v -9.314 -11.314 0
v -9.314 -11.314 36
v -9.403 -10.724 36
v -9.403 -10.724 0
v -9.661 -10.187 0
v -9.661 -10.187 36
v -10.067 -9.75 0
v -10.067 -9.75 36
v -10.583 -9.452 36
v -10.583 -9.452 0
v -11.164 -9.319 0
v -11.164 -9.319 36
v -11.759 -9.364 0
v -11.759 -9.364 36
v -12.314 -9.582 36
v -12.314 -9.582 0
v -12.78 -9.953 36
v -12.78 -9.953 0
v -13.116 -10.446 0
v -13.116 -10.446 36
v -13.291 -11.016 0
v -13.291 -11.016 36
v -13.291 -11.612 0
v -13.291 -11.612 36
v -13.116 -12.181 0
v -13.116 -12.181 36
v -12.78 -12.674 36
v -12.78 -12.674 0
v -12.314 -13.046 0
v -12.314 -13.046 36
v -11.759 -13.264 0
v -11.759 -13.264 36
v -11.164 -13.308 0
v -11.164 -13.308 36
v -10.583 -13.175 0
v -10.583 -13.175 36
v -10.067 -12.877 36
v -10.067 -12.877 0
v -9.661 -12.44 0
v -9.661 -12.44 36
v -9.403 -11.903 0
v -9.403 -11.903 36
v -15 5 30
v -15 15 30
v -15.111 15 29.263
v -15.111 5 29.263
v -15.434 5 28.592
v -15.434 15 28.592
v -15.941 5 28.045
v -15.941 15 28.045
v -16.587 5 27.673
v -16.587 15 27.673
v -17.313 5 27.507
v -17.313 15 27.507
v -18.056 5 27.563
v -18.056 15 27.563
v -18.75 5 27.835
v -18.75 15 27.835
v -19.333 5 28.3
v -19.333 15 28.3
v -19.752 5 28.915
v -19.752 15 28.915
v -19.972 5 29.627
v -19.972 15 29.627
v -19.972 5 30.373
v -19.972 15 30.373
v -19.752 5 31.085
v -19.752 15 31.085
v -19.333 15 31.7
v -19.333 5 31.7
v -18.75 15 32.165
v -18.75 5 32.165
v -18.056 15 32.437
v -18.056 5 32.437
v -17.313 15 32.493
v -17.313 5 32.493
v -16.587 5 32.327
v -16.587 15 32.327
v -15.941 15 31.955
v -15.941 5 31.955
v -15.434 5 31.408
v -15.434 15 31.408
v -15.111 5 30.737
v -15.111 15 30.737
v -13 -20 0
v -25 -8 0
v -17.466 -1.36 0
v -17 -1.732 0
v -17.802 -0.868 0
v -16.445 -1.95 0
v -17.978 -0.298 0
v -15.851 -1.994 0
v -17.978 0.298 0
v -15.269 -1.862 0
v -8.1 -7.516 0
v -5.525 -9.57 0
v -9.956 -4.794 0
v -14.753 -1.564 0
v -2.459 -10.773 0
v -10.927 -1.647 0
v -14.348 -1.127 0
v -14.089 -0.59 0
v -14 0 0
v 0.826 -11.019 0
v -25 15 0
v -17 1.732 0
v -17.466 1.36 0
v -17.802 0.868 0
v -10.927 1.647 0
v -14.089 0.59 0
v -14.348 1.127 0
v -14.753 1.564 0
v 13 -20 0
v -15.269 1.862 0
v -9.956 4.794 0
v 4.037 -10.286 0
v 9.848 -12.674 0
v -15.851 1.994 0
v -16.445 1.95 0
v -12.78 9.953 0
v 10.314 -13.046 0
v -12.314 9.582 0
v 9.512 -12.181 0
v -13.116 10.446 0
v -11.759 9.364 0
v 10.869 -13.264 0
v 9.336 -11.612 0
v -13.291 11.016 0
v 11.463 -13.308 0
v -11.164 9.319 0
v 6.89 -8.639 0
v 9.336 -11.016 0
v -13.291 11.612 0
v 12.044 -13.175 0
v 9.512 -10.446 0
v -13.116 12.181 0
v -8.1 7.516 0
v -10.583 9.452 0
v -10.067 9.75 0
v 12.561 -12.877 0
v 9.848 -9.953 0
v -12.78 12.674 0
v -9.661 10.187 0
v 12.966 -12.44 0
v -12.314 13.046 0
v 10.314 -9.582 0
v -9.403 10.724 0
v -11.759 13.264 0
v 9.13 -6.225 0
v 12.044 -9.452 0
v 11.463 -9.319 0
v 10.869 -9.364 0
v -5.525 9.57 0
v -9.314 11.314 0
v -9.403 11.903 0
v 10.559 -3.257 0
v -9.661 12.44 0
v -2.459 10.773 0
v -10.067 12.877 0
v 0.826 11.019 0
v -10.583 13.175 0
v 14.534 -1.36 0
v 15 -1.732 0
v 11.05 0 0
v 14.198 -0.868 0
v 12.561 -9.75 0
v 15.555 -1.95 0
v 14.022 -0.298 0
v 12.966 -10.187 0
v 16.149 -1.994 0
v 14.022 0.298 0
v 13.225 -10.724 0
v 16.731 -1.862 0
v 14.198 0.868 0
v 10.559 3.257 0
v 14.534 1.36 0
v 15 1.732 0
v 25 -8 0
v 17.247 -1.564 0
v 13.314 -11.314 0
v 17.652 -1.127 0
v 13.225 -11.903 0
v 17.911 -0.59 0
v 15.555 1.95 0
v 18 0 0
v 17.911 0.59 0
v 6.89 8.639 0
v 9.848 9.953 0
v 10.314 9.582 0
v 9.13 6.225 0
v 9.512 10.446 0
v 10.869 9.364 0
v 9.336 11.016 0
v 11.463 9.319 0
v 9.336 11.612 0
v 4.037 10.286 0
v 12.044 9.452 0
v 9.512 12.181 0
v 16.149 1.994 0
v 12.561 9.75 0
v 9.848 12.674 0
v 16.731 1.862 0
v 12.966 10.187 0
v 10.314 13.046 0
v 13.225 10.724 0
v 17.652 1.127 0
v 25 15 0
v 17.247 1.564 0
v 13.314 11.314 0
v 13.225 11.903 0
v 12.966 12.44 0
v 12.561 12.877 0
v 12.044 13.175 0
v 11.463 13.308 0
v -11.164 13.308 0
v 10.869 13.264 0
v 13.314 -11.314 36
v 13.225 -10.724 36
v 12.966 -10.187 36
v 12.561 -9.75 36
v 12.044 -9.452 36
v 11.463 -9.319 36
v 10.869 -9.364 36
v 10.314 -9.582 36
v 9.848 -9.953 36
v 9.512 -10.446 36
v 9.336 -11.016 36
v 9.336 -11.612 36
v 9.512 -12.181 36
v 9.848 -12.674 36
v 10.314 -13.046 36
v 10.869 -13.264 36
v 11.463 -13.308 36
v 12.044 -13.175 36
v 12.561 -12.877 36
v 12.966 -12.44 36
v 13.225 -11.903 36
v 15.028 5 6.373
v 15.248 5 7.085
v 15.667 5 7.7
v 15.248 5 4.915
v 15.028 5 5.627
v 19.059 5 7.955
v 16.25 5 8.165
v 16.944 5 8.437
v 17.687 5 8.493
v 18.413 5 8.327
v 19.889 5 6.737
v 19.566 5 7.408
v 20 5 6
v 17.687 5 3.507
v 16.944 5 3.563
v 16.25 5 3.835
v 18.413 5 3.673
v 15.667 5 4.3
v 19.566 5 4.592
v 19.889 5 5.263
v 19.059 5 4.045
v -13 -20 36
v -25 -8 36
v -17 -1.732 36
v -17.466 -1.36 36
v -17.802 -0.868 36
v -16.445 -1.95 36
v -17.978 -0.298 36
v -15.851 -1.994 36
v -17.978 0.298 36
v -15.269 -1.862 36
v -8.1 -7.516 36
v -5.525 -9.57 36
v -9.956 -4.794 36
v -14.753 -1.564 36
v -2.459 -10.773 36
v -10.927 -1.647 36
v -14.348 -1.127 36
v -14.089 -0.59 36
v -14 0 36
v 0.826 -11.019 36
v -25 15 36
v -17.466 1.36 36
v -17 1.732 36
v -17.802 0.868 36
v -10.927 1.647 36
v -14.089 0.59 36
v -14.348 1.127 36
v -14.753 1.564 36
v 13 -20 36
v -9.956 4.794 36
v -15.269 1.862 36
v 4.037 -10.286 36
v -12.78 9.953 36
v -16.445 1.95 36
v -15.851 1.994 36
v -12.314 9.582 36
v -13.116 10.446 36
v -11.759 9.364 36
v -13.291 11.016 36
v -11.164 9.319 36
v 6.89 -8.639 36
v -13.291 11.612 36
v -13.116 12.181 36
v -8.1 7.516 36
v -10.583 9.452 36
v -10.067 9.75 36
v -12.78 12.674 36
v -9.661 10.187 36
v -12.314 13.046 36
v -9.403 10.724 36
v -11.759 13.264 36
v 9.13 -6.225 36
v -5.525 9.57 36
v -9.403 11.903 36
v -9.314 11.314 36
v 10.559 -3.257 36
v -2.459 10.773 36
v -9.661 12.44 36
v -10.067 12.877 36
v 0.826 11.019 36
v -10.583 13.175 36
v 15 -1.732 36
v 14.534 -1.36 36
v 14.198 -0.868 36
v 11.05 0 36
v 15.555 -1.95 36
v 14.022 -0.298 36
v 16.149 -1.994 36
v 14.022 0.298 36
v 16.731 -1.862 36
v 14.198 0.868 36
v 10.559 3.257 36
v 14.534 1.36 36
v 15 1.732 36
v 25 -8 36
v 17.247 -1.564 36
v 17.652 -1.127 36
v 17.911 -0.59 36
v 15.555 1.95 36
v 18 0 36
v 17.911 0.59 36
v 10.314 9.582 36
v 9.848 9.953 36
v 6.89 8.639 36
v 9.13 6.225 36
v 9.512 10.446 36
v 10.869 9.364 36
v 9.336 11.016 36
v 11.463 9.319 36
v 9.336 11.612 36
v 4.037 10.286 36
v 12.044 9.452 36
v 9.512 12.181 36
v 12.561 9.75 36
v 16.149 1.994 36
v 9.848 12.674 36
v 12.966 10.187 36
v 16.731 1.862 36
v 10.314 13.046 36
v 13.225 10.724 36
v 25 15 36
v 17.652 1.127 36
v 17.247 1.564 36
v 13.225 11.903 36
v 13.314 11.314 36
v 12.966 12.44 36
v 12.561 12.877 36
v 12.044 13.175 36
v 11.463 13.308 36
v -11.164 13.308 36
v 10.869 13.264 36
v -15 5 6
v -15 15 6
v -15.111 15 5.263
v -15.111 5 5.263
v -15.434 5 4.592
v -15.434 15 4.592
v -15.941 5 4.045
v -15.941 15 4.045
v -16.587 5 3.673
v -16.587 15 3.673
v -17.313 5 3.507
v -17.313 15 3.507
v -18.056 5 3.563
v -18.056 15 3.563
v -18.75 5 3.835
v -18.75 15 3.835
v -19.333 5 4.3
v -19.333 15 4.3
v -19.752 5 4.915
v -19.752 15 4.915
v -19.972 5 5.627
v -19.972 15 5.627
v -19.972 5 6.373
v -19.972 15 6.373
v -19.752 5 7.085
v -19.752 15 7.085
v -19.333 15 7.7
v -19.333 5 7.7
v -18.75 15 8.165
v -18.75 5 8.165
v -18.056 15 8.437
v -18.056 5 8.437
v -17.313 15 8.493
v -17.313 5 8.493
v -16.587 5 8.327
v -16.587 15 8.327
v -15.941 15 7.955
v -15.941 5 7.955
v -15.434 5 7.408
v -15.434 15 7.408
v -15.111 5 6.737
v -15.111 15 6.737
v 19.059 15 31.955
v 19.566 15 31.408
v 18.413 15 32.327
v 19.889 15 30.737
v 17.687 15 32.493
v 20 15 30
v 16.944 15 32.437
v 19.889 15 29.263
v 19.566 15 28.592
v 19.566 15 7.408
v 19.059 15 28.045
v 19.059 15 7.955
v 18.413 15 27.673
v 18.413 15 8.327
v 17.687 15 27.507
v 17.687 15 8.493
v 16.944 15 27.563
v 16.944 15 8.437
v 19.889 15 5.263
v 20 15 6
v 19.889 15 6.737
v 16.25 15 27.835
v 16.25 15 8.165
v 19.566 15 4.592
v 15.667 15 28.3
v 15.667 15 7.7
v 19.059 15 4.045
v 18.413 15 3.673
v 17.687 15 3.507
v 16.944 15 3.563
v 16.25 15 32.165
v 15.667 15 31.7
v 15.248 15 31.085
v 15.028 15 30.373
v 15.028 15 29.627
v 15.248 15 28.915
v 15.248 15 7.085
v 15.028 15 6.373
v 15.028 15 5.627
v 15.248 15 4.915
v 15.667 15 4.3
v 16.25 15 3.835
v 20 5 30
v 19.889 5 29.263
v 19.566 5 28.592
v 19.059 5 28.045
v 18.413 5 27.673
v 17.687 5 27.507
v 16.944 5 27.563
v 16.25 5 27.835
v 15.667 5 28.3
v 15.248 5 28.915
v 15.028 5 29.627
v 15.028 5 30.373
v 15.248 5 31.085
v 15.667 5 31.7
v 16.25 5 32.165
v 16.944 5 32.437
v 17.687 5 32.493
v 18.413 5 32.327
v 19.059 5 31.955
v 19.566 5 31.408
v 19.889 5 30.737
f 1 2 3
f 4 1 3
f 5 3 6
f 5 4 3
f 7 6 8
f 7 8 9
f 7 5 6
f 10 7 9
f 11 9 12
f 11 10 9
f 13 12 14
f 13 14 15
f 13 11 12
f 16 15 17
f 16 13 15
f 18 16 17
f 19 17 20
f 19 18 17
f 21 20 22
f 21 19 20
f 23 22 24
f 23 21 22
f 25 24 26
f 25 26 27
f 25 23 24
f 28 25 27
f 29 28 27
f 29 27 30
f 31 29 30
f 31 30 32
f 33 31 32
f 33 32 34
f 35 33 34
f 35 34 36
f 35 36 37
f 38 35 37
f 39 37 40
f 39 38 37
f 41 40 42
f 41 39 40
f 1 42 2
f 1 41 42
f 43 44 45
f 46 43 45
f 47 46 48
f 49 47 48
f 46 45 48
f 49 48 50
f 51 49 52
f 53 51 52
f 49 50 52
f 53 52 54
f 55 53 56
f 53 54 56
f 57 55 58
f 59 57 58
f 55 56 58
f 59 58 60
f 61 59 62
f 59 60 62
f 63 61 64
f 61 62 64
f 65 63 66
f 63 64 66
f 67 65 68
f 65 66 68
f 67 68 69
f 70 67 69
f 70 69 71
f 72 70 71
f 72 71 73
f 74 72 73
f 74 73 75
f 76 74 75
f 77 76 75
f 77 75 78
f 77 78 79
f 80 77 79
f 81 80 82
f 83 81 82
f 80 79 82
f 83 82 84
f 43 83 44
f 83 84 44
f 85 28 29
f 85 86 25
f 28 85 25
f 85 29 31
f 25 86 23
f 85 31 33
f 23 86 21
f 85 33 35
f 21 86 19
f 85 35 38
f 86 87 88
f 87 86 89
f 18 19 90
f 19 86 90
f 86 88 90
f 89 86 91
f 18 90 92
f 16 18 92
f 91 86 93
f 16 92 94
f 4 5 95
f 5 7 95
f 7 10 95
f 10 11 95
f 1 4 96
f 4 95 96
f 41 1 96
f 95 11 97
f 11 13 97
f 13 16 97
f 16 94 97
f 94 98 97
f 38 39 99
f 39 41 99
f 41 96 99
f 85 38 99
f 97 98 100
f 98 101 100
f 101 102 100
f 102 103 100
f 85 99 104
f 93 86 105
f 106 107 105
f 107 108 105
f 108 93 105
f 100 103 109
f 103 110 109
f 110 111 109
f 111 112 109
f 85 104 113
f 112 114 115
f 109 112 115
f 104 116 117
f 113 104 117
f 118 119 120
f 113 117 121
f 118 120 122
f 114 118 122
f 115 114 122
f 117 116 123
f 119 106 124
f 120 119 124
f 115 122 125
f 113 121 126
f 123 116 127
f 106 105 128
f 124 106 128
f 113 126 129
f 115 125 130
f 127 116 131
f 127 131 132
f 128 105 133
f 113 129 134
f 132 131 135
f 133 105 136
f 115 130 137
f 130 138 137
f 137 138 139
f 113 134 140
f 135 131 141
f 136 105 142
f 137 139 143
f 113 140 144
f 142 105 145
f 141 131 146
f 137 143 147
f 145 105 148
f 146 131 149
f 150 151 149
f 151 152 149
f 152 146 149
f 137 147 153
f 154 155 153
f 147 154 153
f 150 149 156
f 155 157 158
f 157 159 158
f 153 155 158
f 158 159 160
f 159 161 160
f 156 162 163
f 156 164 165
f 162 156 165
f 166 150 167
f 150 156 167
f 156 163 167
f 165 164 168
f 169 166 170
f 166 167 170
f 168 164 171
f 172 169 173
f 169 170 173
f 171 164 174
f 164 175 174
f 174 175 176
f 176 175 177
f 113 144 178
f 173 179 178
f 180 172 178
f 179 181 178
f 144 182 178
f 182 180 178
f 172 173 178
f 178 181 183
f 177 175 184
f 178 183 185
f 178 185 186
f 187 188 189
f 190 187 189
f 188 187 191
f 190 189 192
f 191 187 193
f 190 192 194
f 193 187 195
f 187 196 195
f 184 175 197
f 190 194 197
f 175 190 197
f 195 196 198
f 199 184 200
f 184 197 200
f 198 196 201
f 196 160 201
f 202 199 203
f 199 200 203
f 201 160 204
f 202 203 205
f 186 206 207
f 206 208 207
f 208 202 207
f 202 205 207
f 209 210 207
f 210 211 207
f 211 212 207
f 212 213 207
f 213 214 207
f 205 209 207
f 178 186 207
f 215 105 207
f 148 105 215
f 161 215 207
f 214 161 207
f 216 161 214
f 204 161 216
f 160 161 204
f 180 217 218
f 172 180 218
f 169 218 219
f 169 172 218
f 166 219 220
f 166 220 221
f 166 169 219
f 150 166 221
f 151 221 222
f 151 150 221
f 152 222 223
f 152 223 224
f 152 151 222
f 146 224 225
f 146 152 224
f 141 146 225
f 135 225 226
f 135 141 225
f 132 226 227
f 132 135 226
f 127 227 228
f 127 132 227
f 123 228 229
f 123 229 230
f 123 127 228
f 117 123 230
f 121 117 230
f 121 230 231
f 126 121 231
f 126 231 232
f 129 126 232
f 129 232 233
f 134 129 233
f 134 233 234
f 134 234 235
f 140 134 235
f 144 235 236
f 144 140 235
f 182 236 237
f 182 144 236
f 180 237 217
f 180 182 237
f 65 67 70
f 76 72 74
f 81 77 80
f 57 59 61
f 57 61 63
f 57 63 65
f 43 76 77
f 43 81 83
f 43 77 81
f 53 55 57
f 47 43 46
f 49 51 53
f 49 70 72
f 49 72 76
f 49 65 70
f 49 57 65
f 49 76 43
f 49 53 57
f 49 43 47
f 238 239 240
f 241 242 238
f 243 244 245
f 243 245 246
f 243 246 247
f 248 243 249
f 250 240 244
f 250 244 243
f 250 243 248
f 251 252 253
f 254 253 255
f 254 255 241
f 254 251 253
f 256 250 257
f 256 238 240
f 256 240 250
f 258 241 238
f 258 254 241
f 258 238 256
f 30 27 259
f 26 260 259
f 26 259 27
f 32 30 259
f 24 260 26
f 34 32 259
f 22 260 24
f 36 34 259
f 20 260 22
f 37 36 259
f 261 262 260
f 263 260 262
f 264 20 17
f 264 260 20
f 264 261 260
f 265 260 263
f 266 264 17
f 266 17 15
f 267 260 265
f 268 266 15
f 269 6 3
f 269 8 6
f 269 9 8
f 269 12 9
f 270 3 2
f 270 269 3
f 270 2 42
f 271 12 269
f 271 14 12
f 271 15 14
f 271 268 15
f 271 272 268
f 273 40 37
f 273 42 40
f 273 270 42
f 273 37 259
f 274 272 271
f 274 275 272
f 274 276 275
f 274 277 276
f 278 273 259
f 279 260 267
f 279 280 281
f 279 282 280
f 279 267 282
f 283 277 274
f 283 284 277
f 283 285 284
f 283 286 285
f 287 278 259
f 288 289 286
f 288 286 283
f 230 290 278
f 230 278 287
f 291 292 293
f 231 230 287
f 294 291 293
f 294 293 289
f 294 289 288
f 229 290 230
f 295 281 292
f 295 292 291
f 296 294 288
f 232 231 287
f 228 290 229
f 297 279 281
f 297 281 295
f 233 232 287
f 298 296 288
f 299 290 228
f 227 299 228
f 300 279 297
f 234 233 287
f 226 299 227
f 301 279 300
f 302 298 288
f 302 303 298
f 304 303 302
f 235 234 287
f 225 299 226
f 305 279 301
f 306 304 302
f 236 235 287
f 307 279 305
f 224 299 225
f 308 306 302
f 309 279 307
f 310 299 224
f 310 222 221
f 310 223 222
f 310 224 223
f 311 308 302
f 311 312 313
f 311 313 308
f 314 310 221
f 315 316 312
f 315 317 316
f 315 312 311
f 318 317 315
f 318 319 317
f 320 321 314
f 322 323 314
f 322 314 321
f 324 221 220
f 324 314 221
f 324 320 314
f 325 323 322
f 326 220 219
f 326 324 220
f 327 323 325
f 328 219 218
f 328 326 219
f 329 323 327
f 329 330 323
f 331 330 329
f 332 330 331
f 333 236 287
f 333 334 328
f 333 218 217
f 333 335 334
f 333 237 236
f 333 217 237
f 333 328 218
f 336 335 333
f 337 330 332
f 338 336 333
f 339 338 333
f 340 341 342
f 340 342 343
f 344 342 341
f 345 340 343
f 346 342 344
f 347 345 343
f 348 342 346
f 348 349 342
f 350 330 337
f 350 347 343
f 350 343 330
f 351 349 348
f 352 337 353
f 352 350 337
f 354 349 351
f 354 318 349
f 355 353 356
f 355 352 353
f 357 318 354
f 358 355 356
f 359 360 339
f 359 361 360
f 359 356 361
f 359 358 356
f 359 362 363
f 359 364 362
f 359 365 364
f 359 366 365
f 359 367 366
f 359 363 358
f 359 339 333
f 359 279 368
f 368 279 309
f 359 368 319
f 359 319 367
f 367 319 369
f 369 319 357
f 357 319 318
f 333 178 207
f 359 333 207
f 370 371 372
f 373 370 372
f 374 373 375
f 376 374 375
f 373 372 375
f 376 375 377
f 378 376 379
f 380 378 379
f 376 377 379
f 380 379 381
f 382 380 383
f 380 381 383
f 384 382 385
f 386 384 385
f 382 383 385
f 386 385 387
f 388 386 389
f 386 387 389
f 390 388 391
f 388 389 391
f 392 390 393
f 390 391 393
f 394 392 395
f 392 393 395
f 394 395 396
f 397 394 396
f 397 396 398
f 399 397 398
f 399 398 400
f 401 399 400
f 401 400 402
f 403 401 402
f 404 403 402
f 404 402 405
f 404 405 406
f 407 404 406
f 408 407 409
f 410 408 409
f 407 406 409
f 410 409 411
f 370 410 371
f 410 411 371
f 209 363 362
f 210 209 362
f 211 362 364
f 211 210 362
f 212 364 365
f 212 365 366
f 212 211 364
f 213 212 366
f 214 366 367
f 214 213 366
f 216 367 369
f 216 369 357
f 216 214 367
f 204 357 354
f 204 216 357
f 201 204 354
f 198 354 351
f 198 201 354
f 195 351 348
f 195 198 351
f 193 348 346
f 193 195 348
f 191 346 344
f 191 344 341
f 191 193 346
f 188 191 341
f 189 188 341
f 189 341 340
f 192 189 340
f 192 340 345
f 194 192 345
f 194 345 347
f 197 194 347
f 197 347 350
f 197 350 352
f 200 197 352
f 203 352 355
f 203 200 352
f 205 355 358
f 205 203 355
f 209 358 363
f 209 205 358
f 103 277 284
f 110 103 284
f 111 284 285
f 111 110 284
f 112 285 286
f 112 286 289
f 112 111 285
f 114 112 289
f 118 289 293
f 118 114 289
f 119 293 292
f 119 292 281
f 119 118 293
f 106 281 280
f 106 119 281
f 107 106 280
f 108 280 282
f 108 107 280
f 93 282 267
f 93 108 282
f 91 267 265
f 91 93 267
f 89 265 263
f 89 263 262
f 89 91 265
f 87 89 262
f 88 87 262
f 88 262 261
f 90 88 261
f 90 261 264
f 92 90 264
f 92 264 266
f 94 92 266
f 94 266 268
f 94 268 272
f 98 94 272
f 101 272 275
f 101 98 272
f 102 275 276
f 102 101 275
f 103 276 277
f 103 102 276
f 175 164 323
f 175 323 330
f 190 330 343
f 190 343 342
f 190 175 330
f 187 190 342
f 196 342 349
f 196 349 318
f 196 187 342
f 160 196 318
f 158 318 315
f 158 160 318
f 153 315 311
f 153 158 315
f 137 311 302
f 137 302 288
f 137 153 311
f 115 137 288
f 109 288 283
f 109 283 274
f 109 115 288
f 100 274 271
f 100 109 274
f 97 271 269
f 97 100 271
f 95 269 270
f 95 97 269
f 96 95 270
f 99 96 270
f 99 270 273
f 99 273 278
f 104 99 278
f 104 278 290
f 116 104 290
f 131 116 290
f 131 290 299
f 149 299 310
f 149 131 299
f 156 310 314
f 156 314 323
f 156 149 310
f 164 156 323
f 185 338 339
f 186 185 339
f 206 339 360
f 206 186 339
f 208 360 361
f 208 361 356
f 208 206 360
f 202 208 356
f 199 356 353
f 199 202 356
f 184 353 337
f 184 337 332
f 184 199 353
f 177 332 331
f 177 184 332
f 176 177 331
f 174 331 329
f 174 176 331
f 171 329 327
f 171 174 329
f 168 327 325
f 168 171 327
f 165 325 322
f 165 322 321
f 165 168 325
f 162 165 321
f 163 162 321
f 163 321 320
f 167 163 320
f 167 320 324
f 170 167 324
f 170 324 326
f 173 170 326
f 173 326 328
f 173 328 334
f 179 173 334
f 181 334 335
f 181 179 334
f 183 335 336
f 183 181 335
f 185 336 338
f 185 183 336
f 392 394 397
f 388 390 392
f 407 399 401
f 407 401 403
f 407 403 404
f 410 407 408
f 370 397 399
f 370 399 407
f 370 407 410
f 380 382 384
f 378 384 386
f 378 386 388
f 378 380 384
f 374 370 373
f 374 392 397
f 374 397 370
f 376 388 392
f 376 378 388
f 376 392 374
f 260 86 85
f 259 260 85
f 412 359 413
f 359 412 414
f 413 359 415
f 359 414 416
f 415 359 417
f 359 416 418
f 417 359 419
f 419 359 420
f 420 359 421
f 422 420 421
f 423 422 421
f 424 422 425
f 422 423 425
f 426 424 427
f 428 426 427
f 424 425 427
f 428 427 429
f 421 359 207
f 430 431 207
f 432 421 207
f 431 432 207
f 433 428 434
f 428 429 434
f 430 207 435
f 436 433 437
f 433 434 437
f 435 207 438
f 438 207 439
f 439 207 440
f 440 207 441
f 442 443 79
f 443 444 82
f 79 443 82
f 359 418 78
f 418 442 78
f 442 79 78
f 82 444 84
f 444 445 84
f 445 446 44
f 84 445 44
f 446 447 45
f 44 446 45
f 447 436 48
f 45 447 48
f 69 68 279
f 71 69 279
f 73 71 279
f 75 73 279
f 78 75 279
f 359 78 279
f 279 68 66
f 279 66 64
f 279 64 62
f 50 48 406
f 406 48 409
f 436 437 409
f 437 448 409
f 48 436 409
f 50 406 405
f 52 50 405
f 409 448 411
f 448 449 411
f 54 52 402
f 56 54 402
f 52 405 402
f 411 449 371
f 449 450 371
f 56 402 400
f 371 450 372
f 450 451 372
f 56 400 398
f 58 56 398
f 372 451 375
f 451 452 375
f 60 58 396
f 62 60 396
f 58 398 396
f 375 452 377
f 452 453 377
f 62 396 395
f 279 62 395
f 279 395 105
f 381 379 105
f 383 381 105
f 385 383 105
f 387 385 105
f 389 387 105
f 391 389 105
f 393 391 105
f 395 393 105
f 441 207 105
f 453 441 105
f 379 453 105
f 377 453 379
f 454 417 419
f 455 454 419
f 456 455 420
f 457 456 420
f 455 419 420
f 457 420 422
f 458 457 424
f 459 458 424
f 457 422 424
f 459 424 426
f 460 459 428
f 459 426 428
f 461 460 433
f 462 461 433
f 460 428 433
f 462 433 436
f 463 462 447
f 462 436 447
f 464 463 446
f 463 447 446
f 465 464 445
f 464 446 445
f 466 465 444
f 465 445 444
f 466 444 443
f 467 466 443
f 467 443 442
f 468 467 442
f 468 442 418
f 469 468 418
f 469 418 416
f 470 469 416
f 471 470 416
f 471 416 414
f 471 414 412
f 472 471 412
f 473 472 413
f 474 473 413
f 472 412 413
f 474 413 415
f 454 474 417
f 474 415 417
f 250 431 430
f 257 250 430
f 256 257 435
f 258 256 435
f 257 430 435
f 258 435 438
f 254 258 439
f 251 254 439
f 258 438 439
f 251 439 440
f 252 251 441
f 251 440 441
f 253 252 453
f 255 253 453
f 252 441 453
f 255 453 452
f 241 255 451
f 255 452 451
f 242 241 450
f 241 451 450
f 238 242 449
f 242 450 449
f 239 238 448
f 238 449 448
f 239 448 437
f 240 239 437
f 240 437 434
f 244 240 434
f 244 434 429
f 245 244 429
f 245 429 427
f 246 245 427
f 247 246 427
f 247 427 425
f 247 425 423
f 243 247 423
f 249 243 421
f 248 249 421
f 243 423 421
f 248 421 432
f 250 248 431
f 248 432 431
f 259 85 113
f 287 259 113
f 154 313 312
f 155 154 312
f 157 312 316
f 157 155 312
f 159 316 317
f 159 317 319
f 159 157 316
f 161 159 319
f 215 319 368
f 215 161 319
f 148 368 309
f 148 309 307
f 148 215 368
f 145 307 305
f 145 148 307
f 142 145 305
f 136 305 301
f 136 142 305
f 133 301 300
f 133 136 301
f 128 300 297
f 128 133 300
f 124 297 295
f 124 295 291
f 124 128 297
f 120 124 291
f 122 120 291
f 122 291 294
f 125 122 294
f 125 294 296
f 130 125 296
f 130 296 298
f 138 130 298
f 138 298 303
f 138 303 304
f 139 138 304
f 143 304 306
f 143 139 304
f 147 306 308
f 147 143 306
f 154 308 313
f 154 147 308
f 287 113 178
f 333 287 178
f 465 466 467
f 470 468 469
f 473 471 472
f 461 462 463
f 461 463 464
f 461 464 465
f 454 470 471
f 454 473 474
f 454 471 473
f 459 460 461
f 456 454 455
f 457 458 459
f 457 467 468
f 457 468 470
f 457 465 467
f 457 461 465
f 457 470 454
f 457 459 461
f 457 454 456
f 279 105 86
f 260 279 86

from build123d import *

# Parameters (mm, degrees)
SKETCH_1_R          = 11.05
SKETCH_1_R_2        = 2
EXTRUDE_1_DEPTH     = 36
SKETCH_3_R          = 2.5
CUT_EXTRUDE_1_DEPTH = 10


with BuildPart() as part:
    # 草图1 → 凸台-拉伸1 (new body)
    with BuildSketch(Plane.XY):
        Polygon((25, 15), (-25, 15), (-25, -8), (-13, -20), (13, -20), (25, -8), align=None)
        Circle(SKETCH_1_R, mode=Mode.SUBTRACT)
        with Locations((-16, 0)):
            Circle(SKETCH_1_R_2, mode=Mode.SUBTRACT)
        with Locations((-11.313708499, 11.313708499)):
            Circle(SKETCH_1_R_2, mode=Mode.SUBTRACT)
        with Locations((-11.313708499, -11.313708499)):
            Circle(SKETCH_1_R_2, mode=Mode.SUBTRACT)
        with Locations((11.313708499, -11.313708499)):
            Circle(SKETCH_1_R_2, mode=Mode.SUBTRACT)
        with Locations((11.313708499, 11.313708499)):
            Circle(SKETCH_1_R_2, mode=Mode.SUBTRACT)
        with Locations((16, 0)):
            Circle(SKETCH_1_R_2, mode=Mode.SUBTRACT)
    extrude(amount=EXTRUDE_1_DEPTH)

    # 草图3 → 切除-拉伸1 (cut)
    with BuildSketch(Plane(origin=(0, 15, 0), x_dir=(1, 0, 0), z_dir=(0, 1, 0))):
        with Locations((-17.5, -6)):
            Circle(SKETCH_3_R)
        with Locations((-17.5, -30)):
            Circle(SKETCH_3_R)
        with Locations((17.5, -30)):
            Circle(SKETCH_3_R)
        with Locations((17.5, -6)):
            Circle(SKETCH_3_R)
    extrude(amount=-CUT_EXTRUDE_1_DEPTH, mode=Mode.SUBTRACT)


solid = part.part
